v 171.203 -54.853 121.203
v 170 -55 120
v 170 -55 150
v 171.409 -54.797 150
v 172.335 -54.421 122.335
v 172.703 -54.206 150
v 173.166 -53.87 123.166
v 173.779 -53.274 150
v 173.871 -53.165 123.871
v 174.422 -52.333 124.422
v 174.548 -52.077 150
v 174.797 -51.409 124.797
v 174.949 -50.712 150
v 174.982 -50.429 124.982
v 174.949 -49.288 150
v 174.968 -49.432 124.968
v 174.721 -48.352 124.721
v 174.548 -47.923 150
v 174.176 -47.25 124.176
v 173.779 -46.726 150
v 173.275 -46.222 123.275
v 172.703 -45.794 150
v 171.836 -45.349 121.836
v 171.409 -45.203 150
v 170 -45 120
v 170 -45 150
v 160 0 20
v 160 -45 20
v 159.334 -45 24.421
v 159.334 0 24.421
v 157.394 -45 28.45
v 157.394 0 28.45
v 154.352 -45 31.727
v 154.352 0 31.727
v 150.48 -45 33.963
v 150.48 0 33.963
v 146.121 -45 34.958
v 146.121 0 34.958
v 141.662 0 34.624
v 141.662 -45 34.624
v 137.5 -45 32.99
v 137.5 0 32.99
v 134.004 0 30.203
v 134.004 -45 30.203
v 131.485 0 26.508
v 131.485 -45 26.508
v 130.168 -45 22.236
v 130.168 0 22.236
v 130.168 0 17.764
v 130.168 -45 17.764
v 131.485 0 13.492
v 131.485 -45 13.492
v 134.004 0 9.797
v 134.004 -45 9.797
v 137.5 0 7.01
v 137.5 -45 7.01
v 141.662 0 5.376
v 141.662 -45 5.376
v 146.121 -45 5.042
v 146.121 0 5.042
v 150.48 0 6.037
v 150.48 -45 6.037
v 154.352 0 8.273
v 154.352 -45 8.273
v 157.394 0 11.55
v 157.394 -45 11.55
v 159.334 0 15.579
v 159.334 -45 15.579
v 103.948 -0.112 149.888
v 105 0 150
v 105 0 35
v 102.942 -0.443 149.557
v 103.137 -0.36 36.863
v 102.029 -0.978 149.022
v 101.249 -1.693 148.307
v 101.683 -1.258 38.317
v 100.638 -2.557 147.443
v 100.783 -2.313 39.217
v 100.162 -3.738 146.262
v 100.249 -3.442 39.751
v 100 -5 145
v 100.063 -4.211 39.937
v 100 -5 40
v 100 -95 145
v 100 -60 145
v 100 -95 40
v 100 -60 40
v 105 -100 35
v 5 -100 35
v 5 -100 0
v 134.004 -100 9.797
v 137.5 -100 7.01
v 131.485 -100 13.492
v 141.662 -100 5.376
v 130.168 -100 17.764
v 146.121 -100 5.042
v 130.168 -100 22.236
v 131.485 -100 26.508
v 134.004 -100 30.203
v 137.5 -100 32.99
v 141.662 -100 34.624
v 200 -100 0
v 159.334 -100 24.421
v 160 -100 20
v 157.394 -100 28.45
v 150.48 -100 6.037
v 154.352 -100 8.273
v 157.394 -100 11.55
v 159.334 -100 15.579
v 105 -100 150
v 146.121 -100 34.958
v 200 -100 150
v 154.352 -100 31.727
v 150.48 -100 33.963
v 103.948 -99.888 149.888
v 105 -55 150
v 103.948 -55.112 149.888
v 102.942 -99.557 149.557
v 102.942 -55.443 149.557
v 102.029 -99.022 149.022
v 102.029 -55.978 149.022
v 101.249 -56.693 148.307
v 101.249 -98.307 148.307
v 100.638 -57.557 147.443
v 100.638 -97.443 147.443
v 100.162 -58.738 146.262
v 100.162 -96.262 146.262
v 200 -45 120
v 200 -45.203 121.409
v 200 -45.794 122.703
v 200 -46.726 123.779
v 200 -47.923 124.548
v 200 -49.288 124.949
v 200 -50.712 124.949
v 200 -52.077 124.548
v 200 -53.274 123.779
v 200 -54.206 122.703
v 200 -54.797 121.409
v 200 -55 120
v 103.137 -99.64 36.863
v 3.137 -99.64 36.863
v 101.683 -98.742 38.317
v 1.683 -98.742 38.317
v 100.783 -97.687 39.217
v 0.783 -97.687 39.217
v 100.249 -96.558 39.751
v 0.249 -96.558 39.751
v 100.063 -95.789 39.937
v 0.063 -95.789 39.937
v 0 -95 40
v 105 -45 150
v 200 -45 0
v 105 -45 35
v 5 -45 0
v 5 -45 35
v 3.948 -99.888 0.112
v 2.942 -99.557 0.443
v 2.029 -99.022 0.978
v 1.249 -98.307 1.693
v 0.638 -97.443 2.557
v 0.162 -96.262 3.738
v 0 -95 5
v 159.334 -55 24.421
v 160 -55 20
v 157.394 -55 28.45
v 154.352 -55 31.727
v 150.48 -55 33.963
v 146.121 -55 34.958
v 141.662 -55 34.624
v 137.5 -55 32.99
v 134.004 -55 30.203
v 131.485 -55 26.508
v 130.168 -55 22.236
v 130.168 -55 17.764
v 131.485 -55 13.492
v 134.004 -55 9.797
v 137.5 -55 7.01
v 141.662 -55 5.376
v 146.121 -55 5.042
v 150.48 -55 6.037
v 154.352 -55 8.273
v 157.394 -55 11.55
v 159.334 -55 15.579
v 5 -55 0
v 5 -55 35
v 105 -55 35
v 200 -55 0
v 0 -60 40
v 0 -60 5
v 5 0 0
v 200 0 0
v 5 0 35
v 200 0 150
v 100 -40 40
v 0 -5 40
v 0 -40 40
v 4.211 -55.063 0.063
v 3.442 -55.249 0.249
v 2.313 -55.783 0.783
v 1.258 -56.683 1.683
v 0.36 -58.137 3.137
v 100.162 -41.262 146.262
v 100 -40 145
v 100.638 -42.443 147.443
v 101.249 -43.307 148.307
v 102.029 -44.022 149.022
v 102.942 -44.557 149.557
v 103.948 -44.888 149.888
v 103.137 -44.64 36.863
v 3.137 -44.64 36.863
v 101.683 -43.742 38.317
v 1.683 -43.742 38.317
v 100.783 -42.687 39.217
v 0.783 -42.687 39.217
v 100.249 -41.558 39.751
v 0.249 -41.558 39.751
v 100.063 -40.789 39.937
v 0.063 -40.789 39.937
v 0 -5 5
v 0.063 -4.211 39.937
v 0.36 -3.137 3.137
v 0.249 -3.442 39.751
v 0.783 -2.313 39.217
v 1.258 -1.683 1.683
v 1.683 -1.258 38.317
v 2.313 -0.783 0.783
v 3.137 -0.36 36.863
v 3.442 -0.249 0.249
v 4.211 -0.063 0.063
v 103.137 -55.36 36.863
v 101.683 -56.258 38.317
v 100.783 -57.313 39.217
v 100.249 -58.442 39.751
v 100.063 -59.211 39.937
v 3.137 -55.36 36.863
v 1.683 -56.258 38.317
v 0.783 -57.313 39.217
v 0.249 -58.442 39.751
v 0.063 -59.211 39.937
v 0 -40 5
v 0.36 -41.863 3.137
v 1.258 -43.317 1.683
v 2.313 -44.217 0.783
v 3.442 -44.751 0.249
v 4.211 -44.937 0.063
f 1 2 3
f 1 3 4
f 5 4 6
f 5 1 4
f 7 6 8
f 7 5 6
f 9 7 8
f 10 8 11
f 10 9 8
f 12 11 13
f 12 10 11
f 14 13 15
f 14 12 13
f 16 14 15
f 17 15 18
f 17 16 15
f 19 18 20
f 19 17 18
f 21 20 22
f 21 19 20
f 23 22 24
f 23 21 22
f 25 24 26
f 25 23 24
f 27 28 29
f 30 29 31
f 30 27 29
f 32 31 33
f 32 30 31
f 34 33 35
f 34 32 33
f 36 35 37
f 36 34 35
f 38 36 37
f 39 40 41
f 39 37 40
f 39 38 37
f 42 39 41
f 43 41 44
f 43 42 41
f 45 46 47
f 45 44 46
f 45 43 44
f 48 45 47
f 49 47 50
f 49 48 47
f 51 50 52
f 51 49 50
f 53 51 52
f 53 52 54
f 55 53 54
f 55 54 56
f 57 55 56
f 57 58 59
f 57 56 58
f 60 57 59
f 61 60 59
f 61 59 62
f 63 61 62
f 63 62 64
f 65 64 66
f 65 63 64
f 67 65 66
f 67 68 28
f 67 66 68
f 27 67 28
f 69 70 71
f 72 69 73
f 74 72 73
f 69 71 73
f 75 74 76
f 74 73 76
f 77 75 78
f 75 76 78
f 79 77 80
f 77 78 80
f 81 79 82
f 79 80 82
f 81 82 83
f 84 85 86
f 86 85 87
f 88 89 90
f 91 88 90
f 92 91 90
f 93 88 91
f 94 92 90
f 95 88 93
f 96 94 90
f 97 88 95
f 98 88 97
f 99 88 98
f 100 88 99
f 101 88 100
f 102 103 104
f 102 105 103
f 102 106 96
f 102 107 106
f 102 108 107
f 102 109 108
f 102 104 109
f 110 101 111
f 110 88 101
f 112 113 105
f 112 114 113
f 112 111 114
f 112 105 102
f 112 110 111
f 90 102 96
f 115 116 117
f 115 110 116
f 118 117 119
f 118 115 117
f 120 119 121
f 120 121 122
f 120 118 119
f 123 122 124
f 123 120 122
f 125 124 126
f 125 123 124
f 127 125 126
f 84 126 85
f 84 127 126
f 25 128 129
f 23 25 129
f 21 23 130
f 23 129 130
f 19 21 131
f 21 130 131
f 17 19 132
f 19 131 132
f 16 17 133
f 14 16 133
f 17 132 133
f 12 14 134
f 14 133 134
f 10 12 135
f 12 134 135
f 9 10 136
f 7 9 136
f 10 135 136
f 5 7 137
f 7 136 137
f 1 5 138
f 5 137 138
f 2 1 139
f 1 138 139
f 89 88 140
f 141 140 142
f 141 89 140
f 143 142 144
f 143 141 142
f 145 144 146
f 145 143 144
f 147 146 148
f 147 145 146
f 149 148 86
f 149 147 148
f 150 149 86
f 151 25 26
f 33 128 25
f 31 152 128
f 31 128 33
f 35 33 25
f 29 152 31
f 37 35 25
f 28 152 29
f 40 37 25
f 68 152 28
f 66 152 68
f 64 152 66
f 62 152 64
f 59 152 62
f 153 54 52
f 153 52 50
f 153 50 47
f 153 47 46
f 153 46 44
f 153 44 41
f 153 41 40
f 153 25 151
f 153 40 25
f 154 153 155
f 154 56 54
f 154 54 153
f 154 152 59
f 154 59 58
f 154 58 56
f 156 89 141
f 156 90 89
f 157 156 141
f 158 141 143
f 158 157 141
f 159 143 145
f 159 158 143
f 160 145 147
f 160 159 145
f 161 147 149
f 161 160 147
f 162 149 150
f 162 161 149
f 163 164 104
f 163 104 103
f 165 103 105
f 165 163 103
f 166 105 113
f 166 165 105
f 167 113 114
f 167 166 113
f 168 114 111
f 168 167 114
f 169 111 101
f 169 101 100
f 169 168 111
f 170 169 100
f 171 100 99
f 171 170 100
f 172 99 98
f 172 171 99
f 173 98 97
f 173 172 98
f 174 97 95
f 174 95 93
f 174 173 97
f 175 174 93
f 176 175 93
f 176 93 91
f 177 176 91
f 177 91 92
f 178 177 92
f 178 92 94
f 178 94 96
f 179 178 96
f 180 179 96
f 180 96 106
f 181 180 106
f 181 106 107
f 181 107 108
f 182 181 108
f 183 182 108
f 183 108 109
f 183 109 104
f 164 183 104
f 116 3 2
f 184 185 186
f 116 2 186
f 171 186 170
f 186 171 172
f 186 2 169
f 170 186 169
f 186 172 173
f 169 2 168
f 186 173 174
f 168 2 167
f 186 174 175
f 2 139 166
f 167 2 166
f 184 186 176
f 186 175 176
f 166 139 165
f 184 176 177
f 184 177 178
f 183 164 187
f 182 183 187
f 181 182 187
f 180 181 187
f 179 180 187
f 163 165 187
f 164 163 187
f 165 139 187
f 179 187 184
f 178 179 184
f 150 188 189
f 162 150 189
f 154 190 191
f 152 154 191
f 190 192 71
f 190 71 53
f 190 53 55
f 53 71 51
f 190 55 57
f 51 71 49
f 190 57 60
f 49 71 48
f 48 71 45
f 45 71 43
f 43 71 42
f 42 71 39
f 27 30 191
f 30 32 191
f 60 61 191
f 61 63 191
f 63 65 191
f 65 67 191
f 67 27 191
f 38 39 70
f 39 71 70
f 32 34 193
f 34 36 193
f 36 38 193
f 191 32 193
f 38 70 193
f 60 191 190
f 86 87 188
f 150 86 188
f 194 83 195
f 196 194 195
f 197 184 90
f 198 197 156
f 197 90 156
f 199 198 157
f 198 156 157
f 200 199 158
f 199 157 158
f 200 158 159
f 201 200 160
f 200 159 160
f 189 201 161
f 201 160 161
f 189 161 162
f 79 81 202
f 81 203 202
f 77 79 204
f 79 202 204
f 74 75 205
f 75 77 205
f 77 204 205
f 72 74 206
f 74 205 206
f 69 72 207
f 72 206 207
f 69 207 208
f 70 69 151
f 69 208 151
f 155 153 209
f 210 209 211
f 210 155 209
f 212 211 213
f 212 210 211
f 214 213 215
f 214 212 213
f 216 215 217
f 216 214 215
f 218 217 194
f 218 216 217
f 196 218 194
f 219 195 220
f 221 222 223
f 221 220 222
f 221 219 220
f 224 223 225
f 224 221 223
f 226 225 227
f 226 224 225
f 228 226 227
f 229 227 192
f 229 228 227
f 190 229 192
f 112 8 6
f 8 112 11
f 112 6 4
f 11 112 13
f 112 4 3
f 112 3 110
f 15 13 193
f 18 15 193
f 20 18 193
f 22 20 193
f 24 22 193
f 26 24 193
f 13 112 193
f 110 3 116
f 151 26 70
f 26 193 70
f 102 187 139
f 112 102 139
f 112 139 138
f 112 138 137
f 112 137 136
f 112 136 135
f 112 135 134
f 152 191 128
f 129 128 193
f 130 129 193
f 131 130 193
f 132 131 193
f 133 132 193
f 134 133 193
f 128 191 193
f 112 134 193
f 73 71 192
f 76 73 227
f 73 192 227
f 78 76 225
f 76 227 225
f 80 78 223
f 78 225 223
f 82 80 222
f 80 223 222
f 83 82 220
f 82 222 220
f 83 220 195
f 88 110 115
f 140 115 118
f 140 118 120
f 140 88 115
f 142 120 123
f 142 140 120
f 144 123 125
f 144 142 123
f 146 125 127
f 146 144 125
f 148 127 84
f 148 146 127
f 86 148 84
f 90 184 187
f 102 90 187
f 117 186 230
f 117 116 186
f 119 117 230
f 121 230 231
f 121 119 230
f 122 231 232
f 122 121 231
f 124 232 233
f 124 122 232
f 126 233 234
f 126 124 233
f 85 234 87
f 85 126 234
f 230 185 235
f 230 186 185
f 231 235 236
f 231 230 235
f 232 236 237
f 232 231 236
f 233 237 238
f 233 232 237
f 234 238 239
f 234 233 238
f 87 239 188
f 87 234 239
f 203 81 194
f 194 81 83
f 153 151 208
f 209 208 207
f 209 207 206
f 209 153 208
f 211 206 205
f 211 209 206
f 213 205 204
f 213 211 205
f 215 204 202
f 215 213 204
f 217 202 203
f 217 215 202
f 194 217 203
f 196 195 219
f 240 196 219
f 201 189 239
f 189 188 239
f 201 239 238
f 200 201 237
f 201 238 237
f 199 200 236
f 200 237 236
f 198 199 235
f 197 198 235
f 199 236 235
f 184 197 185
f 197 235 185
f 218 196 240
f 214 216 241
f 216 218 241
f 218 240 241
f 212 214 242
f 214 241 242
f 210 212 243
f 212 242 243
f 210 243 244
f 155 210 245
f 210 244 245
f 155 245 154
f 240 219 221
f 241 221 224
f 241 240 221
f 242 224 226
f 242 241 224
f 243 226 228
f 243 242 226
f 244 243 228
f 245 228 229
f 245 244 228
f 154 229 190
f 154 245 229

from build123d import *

# Parameters (mm, degrees)
F0_R     = 15
F1_DEPTH = 100
F3_DEPTH = 150
F5_R     = 5
F7_DEPTH = 300


# Not quite as in the source:
# - the program builds the solid bodies; features that only make, move or delete a surface that nothing else refers to are left out


with BuildPart() as f1:
    # F0 (on Front) → F1 (new body)
    with BuildSketch(Plane.XZ):
        Polygon((0, 40), (0, 0), (200, 0), (200, 150), (100, 150), (100, 40), align=None)
        with Locations((145, 20)):
            Circle(F0_R, mode=Mode.SUBTRACT)
    extrude(amount=F1_DEPTH)

    # F2 (on Top) → F3 (cut, through all)
    with BuildSketch(Plane.XY):
        with BuildLine():
            Line((-30, -55), (170, -55))
            ThreePointArc((170, -55), (175, -50), (170, -45))
            Line((170, -45), (-30, -45))
            Line((-30, -45), (-30, -55))
        make_face()
    extrude(amount=F3_DEPTH, mode=Mode.SUBTRACT)

    # F5
    f5_edges = [f1.edges().sort_by_distance(p)[0] for p in [
        (100, -45, 95),
        (100, -55, 95),
        (100, -100, 95),
        (50, -100, 40),
        (50, -55, 40),
        (50, -45, 40),
        (100, 0, 95),
        (50, 0, 40),
        (0, 0, 20),
        (0, -45, 20),
        (0, -22.5, 0),
        (0, -55, 20),
        (0, -100, 20),
        (0, -77.5, 0),
        (100, -22.5, 150),
        (100, -77.5, 150),
    ]]
    fillet(f5_edges, radius=F5_R)

    # F6 (on face) → F7 (cut)
    with BuildSketch(Plane.YZ.offset(200)):
        with BuildLine():
            Line((-45, -10), (-45, 120))
            ThreePointArc((-45, 120), (-50, 125), (-55, 120))
            Line((-55, 120), (-55, -10))
            Line((-55, -10), (-45, -10))
        make_face()
    extrude(amount=-F7_DEPTH, mode=Mode.SUBTRACT)


solid = f1.part
